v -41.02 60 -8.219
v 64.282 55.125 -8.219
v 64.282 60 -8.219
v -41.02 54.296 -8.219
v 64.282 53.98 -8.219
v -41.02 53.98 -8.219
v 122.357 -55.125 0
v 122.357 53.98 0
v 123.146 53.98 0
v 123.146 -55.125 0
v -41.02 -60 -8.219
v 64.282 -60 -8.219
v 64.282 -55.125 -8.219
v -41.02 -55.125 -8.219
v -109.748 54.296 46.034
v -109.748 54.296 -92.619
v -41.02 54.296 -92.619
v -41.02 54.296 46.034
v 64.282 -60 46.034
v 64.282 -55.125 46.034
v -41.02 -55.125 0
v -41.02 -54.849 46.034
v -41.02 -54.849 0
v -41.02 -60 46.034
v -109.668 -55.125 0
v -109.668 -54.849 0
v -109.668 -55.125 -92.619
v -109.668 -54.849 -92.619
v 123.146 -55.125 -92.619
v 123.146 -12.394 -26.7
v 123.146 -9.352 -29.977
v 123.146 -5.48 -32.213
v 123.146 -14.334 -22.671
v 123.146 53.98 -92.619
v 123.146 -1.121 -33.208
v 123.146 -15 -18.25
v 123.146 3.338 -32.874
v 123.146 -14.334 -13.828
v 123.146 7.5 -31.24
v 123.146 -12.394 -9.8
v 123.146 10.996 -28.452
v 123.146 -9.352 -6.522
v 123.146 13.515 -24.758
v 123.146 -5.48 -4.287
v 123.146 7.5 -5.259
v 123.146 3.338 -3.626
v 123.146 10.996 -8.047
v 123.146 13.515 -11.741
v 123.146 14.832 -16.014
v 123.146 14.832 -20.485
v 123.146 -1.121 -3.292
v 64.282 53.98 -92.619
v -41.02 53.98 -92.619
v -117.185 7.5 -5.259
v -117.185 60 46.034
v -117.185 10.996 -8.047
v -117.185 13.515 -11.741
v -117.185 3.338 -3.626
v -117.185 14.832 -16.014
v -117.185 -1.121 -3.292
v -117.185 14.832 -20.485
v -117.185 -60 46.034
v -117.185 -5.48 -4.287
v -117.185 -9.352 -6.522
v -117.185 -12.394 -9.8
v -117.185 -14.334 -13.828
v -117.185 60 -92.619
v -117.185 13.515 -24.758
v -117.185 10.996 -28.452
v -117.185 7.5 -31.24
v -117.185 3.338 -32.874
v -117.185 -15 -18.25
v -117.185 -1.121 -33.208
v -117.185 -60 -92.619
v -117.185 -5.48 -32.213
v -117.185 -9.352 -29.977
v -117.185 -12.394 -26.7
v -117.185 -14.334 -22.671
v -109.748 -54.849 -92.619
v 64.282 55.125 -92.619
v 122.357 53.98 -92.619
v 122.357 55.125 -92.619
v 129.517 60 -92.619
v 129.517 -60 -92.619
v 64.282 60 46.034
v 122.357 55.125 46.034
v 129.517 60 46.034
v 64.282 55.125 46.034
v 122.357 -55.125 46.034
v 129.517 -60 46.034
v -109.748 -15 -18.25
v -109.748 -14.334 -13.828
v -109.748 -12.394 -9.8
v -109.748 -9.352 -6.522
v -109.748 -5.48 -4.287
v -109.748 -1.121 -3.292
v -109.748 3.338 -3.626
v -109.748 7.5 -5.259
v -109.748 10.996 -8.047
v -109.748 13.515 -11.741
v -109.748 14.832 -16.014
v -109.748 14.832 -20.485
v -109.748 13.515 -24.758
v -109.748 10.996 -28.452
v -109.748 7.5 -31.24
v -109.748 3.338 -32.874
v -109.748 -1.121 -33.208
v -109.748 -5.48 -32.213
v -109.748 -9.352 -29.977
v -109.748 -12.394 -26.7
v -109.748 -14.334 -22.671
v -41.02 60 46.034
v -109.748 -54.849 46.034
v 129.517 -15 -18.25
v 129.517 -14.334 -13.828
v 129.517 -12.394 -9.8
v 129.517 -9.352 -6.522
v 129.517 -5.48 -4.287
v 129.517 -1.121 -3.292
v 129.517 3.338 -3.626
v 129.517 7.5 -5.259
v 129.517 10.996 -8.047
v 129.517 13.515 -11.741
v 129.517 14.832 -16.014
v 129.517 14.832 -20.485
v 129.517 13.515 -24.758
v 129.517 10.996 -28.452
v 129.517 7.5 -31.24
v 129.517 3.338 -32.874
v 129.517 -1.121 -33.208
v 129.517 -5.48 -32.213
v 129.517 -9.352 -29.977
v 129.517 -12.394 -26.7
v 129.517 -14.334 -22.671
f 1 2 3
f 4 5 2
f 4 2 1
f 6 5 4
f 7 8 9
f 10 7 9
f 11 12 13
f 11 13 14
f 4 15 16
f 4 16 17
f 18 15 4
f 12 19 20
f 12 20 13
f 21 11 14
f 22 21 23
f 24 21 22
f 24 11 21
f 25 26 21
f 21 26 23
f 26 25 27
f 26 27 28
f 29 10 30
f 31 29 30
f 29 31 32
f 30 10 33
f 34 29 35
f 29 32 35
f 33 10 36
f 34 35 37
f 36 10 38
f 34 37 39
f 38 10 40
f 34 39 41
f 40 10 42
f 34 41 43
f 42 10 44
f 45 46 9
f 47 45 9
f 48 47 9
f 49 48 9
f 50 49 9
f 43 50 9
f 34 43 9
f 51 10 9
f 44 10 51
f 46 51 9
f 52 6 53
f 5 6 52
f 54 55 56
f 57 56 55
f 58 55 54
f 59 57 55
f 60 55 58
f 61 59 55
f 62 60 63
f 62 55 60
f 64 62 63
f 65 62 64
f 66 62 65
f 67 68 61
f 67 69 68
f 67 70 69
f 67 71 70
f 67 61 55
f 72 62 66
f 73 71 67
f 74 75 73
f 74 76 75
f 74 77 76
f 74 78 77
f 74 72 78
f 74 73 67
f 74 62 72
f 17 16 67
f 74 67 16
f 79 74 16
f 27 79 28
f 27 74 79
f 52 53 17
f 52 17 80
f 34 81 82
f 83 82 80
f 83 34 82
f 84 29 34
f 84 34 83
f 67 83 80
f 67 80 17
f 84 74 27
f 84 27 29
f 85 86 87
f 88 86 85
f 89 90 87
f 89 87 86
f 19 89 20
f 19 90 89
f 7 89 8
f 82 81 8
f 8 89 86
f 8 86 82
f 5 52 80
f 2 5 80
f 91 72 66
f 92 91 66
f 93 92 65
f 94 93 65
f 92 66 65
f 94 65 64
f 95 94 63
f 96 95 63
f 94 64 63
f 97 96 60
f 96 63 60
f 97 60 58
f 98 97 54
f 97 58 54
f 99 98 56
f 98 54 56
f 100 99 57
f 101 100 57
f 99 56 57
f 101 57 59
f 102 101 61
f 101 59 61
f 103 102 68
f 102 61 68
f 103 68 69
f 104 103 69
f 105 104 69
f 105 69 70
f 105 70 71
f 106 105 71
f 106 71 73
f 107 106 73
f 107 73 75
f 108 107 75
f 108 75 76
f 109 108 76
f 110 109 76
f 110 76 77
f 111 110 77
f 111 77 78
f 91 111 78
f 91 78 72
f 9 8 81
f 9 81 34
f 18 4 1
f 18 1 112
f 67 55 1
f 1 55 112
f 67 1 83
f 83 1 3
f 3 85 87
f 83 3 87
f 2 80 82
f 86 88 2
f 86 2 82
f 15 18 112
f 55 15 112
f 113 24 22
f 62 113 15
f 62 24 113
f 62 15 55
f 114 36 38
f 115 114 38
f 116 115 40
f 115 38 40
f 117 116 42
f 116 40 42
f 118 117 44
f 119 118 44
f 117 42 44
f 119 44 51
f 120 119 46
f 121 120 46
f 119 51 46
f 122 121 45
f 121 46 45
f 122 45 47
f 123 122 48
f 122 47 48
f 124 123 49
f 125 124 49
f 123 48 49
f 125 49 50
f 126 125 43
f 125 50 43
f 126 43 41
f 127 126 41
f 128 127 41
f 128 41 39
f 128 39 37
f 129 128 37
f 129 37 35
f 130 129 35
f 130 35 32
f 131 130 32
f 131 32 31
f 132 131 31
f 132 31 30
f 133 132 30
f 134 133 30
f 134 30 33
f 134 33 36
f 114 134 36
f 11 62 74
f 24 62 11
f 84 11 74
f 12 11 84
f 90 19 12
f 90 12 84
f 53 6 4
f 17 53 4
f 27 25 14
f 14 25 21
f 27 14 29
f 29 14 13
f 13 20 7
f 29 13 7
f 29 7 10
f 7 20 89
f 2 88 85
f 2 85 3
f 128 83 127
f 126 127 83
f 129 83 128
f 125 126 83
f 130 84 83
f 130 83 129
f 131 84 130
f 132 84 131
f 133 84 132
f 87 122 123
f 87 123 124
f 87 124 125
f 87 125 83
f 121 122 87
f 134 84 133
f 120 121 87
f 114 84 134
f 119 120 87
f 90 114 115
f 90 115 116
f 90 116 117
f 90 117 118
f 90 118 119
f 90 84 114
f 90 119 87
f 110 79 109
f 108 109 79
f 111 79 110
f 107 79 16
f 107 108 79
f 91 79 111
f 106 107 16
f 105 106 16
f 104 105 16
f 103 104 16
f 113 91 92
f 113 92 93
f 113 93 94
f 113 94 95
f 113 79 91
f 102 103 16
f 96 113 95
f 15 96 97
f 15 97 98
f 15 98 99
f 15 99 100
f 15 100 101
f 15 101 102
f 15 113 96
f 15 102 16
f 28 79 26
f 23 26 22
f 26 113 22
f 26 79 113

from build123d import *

# Parameters (mm, degrees)
F1_DEPTH = 60
F4_W     = 68.7287449837
F4_H     = 109.1447398067
F5_DEPTH = 150.7
F2_W     = 232.8136488795
F2_H     = 109.1045513749
F6_DEPTH = 101.1
F7_W     = 58.0749809742
F7_H     = 110.2500036359
F8_DEPTH = 147.8
F9_D     = 30


with BuildPart() as f1:
    # F0 (on Front) → F1 (new body, symmetric)
    with BuildSketch(Plane.XZ):
        Polygon((-117.1853020787, 46.0337400436), (-117.1853020787, -92.6193669438), (129.5173019171, -92.6193669438), (129.5173019171, 46.0337400436), (64.2818138003, 46.0337400436), (64.2818138003, -8.2185808569), (-41.0197302699, -8.2185808569), (-41.0197302699, 46.0337400436), align=None)
    extrude(amount=F1_DEPTH, both=True)

    # F4 (on face) → F5 (cut)
    with BuildSketch(Plane.XY.offset(46.0337400436)):
        with Locations((-75.3841027617, -0.2763159573)):
            Rectangle(F4_W, F4_H)
    extrude(amount=-F5_DEPTH, mode=Mode.SUBTRACT)

    # F2 (on Top) → F6 (cut)
    with BuildSketch(Plane.XY):
        with Locations((6.7387260497, -0.5727261305)):
            Rectangle(F2_W, F2_H)
    extrude(amount=-F6_DEPTH, mode=Mode.SUBTRACT)

    # F7 (on face) → F8 (cut)
    with BuildSketch(Plane.XY.offset(46.0337400436)):
        with Locations((93.3193042874, 0)):
            Rectangle(F7_W, F7_H)
    extrude(amount=-F8_DEPTH, mode=Mode.SUBTRACT)

    # F9 (through all)
    with Locations(Plane.YZ.offset(129.5173019171)):
        with Locations((0, -18.2496998459)):
            Hole(F9_D / 2)


solid = f1.part
